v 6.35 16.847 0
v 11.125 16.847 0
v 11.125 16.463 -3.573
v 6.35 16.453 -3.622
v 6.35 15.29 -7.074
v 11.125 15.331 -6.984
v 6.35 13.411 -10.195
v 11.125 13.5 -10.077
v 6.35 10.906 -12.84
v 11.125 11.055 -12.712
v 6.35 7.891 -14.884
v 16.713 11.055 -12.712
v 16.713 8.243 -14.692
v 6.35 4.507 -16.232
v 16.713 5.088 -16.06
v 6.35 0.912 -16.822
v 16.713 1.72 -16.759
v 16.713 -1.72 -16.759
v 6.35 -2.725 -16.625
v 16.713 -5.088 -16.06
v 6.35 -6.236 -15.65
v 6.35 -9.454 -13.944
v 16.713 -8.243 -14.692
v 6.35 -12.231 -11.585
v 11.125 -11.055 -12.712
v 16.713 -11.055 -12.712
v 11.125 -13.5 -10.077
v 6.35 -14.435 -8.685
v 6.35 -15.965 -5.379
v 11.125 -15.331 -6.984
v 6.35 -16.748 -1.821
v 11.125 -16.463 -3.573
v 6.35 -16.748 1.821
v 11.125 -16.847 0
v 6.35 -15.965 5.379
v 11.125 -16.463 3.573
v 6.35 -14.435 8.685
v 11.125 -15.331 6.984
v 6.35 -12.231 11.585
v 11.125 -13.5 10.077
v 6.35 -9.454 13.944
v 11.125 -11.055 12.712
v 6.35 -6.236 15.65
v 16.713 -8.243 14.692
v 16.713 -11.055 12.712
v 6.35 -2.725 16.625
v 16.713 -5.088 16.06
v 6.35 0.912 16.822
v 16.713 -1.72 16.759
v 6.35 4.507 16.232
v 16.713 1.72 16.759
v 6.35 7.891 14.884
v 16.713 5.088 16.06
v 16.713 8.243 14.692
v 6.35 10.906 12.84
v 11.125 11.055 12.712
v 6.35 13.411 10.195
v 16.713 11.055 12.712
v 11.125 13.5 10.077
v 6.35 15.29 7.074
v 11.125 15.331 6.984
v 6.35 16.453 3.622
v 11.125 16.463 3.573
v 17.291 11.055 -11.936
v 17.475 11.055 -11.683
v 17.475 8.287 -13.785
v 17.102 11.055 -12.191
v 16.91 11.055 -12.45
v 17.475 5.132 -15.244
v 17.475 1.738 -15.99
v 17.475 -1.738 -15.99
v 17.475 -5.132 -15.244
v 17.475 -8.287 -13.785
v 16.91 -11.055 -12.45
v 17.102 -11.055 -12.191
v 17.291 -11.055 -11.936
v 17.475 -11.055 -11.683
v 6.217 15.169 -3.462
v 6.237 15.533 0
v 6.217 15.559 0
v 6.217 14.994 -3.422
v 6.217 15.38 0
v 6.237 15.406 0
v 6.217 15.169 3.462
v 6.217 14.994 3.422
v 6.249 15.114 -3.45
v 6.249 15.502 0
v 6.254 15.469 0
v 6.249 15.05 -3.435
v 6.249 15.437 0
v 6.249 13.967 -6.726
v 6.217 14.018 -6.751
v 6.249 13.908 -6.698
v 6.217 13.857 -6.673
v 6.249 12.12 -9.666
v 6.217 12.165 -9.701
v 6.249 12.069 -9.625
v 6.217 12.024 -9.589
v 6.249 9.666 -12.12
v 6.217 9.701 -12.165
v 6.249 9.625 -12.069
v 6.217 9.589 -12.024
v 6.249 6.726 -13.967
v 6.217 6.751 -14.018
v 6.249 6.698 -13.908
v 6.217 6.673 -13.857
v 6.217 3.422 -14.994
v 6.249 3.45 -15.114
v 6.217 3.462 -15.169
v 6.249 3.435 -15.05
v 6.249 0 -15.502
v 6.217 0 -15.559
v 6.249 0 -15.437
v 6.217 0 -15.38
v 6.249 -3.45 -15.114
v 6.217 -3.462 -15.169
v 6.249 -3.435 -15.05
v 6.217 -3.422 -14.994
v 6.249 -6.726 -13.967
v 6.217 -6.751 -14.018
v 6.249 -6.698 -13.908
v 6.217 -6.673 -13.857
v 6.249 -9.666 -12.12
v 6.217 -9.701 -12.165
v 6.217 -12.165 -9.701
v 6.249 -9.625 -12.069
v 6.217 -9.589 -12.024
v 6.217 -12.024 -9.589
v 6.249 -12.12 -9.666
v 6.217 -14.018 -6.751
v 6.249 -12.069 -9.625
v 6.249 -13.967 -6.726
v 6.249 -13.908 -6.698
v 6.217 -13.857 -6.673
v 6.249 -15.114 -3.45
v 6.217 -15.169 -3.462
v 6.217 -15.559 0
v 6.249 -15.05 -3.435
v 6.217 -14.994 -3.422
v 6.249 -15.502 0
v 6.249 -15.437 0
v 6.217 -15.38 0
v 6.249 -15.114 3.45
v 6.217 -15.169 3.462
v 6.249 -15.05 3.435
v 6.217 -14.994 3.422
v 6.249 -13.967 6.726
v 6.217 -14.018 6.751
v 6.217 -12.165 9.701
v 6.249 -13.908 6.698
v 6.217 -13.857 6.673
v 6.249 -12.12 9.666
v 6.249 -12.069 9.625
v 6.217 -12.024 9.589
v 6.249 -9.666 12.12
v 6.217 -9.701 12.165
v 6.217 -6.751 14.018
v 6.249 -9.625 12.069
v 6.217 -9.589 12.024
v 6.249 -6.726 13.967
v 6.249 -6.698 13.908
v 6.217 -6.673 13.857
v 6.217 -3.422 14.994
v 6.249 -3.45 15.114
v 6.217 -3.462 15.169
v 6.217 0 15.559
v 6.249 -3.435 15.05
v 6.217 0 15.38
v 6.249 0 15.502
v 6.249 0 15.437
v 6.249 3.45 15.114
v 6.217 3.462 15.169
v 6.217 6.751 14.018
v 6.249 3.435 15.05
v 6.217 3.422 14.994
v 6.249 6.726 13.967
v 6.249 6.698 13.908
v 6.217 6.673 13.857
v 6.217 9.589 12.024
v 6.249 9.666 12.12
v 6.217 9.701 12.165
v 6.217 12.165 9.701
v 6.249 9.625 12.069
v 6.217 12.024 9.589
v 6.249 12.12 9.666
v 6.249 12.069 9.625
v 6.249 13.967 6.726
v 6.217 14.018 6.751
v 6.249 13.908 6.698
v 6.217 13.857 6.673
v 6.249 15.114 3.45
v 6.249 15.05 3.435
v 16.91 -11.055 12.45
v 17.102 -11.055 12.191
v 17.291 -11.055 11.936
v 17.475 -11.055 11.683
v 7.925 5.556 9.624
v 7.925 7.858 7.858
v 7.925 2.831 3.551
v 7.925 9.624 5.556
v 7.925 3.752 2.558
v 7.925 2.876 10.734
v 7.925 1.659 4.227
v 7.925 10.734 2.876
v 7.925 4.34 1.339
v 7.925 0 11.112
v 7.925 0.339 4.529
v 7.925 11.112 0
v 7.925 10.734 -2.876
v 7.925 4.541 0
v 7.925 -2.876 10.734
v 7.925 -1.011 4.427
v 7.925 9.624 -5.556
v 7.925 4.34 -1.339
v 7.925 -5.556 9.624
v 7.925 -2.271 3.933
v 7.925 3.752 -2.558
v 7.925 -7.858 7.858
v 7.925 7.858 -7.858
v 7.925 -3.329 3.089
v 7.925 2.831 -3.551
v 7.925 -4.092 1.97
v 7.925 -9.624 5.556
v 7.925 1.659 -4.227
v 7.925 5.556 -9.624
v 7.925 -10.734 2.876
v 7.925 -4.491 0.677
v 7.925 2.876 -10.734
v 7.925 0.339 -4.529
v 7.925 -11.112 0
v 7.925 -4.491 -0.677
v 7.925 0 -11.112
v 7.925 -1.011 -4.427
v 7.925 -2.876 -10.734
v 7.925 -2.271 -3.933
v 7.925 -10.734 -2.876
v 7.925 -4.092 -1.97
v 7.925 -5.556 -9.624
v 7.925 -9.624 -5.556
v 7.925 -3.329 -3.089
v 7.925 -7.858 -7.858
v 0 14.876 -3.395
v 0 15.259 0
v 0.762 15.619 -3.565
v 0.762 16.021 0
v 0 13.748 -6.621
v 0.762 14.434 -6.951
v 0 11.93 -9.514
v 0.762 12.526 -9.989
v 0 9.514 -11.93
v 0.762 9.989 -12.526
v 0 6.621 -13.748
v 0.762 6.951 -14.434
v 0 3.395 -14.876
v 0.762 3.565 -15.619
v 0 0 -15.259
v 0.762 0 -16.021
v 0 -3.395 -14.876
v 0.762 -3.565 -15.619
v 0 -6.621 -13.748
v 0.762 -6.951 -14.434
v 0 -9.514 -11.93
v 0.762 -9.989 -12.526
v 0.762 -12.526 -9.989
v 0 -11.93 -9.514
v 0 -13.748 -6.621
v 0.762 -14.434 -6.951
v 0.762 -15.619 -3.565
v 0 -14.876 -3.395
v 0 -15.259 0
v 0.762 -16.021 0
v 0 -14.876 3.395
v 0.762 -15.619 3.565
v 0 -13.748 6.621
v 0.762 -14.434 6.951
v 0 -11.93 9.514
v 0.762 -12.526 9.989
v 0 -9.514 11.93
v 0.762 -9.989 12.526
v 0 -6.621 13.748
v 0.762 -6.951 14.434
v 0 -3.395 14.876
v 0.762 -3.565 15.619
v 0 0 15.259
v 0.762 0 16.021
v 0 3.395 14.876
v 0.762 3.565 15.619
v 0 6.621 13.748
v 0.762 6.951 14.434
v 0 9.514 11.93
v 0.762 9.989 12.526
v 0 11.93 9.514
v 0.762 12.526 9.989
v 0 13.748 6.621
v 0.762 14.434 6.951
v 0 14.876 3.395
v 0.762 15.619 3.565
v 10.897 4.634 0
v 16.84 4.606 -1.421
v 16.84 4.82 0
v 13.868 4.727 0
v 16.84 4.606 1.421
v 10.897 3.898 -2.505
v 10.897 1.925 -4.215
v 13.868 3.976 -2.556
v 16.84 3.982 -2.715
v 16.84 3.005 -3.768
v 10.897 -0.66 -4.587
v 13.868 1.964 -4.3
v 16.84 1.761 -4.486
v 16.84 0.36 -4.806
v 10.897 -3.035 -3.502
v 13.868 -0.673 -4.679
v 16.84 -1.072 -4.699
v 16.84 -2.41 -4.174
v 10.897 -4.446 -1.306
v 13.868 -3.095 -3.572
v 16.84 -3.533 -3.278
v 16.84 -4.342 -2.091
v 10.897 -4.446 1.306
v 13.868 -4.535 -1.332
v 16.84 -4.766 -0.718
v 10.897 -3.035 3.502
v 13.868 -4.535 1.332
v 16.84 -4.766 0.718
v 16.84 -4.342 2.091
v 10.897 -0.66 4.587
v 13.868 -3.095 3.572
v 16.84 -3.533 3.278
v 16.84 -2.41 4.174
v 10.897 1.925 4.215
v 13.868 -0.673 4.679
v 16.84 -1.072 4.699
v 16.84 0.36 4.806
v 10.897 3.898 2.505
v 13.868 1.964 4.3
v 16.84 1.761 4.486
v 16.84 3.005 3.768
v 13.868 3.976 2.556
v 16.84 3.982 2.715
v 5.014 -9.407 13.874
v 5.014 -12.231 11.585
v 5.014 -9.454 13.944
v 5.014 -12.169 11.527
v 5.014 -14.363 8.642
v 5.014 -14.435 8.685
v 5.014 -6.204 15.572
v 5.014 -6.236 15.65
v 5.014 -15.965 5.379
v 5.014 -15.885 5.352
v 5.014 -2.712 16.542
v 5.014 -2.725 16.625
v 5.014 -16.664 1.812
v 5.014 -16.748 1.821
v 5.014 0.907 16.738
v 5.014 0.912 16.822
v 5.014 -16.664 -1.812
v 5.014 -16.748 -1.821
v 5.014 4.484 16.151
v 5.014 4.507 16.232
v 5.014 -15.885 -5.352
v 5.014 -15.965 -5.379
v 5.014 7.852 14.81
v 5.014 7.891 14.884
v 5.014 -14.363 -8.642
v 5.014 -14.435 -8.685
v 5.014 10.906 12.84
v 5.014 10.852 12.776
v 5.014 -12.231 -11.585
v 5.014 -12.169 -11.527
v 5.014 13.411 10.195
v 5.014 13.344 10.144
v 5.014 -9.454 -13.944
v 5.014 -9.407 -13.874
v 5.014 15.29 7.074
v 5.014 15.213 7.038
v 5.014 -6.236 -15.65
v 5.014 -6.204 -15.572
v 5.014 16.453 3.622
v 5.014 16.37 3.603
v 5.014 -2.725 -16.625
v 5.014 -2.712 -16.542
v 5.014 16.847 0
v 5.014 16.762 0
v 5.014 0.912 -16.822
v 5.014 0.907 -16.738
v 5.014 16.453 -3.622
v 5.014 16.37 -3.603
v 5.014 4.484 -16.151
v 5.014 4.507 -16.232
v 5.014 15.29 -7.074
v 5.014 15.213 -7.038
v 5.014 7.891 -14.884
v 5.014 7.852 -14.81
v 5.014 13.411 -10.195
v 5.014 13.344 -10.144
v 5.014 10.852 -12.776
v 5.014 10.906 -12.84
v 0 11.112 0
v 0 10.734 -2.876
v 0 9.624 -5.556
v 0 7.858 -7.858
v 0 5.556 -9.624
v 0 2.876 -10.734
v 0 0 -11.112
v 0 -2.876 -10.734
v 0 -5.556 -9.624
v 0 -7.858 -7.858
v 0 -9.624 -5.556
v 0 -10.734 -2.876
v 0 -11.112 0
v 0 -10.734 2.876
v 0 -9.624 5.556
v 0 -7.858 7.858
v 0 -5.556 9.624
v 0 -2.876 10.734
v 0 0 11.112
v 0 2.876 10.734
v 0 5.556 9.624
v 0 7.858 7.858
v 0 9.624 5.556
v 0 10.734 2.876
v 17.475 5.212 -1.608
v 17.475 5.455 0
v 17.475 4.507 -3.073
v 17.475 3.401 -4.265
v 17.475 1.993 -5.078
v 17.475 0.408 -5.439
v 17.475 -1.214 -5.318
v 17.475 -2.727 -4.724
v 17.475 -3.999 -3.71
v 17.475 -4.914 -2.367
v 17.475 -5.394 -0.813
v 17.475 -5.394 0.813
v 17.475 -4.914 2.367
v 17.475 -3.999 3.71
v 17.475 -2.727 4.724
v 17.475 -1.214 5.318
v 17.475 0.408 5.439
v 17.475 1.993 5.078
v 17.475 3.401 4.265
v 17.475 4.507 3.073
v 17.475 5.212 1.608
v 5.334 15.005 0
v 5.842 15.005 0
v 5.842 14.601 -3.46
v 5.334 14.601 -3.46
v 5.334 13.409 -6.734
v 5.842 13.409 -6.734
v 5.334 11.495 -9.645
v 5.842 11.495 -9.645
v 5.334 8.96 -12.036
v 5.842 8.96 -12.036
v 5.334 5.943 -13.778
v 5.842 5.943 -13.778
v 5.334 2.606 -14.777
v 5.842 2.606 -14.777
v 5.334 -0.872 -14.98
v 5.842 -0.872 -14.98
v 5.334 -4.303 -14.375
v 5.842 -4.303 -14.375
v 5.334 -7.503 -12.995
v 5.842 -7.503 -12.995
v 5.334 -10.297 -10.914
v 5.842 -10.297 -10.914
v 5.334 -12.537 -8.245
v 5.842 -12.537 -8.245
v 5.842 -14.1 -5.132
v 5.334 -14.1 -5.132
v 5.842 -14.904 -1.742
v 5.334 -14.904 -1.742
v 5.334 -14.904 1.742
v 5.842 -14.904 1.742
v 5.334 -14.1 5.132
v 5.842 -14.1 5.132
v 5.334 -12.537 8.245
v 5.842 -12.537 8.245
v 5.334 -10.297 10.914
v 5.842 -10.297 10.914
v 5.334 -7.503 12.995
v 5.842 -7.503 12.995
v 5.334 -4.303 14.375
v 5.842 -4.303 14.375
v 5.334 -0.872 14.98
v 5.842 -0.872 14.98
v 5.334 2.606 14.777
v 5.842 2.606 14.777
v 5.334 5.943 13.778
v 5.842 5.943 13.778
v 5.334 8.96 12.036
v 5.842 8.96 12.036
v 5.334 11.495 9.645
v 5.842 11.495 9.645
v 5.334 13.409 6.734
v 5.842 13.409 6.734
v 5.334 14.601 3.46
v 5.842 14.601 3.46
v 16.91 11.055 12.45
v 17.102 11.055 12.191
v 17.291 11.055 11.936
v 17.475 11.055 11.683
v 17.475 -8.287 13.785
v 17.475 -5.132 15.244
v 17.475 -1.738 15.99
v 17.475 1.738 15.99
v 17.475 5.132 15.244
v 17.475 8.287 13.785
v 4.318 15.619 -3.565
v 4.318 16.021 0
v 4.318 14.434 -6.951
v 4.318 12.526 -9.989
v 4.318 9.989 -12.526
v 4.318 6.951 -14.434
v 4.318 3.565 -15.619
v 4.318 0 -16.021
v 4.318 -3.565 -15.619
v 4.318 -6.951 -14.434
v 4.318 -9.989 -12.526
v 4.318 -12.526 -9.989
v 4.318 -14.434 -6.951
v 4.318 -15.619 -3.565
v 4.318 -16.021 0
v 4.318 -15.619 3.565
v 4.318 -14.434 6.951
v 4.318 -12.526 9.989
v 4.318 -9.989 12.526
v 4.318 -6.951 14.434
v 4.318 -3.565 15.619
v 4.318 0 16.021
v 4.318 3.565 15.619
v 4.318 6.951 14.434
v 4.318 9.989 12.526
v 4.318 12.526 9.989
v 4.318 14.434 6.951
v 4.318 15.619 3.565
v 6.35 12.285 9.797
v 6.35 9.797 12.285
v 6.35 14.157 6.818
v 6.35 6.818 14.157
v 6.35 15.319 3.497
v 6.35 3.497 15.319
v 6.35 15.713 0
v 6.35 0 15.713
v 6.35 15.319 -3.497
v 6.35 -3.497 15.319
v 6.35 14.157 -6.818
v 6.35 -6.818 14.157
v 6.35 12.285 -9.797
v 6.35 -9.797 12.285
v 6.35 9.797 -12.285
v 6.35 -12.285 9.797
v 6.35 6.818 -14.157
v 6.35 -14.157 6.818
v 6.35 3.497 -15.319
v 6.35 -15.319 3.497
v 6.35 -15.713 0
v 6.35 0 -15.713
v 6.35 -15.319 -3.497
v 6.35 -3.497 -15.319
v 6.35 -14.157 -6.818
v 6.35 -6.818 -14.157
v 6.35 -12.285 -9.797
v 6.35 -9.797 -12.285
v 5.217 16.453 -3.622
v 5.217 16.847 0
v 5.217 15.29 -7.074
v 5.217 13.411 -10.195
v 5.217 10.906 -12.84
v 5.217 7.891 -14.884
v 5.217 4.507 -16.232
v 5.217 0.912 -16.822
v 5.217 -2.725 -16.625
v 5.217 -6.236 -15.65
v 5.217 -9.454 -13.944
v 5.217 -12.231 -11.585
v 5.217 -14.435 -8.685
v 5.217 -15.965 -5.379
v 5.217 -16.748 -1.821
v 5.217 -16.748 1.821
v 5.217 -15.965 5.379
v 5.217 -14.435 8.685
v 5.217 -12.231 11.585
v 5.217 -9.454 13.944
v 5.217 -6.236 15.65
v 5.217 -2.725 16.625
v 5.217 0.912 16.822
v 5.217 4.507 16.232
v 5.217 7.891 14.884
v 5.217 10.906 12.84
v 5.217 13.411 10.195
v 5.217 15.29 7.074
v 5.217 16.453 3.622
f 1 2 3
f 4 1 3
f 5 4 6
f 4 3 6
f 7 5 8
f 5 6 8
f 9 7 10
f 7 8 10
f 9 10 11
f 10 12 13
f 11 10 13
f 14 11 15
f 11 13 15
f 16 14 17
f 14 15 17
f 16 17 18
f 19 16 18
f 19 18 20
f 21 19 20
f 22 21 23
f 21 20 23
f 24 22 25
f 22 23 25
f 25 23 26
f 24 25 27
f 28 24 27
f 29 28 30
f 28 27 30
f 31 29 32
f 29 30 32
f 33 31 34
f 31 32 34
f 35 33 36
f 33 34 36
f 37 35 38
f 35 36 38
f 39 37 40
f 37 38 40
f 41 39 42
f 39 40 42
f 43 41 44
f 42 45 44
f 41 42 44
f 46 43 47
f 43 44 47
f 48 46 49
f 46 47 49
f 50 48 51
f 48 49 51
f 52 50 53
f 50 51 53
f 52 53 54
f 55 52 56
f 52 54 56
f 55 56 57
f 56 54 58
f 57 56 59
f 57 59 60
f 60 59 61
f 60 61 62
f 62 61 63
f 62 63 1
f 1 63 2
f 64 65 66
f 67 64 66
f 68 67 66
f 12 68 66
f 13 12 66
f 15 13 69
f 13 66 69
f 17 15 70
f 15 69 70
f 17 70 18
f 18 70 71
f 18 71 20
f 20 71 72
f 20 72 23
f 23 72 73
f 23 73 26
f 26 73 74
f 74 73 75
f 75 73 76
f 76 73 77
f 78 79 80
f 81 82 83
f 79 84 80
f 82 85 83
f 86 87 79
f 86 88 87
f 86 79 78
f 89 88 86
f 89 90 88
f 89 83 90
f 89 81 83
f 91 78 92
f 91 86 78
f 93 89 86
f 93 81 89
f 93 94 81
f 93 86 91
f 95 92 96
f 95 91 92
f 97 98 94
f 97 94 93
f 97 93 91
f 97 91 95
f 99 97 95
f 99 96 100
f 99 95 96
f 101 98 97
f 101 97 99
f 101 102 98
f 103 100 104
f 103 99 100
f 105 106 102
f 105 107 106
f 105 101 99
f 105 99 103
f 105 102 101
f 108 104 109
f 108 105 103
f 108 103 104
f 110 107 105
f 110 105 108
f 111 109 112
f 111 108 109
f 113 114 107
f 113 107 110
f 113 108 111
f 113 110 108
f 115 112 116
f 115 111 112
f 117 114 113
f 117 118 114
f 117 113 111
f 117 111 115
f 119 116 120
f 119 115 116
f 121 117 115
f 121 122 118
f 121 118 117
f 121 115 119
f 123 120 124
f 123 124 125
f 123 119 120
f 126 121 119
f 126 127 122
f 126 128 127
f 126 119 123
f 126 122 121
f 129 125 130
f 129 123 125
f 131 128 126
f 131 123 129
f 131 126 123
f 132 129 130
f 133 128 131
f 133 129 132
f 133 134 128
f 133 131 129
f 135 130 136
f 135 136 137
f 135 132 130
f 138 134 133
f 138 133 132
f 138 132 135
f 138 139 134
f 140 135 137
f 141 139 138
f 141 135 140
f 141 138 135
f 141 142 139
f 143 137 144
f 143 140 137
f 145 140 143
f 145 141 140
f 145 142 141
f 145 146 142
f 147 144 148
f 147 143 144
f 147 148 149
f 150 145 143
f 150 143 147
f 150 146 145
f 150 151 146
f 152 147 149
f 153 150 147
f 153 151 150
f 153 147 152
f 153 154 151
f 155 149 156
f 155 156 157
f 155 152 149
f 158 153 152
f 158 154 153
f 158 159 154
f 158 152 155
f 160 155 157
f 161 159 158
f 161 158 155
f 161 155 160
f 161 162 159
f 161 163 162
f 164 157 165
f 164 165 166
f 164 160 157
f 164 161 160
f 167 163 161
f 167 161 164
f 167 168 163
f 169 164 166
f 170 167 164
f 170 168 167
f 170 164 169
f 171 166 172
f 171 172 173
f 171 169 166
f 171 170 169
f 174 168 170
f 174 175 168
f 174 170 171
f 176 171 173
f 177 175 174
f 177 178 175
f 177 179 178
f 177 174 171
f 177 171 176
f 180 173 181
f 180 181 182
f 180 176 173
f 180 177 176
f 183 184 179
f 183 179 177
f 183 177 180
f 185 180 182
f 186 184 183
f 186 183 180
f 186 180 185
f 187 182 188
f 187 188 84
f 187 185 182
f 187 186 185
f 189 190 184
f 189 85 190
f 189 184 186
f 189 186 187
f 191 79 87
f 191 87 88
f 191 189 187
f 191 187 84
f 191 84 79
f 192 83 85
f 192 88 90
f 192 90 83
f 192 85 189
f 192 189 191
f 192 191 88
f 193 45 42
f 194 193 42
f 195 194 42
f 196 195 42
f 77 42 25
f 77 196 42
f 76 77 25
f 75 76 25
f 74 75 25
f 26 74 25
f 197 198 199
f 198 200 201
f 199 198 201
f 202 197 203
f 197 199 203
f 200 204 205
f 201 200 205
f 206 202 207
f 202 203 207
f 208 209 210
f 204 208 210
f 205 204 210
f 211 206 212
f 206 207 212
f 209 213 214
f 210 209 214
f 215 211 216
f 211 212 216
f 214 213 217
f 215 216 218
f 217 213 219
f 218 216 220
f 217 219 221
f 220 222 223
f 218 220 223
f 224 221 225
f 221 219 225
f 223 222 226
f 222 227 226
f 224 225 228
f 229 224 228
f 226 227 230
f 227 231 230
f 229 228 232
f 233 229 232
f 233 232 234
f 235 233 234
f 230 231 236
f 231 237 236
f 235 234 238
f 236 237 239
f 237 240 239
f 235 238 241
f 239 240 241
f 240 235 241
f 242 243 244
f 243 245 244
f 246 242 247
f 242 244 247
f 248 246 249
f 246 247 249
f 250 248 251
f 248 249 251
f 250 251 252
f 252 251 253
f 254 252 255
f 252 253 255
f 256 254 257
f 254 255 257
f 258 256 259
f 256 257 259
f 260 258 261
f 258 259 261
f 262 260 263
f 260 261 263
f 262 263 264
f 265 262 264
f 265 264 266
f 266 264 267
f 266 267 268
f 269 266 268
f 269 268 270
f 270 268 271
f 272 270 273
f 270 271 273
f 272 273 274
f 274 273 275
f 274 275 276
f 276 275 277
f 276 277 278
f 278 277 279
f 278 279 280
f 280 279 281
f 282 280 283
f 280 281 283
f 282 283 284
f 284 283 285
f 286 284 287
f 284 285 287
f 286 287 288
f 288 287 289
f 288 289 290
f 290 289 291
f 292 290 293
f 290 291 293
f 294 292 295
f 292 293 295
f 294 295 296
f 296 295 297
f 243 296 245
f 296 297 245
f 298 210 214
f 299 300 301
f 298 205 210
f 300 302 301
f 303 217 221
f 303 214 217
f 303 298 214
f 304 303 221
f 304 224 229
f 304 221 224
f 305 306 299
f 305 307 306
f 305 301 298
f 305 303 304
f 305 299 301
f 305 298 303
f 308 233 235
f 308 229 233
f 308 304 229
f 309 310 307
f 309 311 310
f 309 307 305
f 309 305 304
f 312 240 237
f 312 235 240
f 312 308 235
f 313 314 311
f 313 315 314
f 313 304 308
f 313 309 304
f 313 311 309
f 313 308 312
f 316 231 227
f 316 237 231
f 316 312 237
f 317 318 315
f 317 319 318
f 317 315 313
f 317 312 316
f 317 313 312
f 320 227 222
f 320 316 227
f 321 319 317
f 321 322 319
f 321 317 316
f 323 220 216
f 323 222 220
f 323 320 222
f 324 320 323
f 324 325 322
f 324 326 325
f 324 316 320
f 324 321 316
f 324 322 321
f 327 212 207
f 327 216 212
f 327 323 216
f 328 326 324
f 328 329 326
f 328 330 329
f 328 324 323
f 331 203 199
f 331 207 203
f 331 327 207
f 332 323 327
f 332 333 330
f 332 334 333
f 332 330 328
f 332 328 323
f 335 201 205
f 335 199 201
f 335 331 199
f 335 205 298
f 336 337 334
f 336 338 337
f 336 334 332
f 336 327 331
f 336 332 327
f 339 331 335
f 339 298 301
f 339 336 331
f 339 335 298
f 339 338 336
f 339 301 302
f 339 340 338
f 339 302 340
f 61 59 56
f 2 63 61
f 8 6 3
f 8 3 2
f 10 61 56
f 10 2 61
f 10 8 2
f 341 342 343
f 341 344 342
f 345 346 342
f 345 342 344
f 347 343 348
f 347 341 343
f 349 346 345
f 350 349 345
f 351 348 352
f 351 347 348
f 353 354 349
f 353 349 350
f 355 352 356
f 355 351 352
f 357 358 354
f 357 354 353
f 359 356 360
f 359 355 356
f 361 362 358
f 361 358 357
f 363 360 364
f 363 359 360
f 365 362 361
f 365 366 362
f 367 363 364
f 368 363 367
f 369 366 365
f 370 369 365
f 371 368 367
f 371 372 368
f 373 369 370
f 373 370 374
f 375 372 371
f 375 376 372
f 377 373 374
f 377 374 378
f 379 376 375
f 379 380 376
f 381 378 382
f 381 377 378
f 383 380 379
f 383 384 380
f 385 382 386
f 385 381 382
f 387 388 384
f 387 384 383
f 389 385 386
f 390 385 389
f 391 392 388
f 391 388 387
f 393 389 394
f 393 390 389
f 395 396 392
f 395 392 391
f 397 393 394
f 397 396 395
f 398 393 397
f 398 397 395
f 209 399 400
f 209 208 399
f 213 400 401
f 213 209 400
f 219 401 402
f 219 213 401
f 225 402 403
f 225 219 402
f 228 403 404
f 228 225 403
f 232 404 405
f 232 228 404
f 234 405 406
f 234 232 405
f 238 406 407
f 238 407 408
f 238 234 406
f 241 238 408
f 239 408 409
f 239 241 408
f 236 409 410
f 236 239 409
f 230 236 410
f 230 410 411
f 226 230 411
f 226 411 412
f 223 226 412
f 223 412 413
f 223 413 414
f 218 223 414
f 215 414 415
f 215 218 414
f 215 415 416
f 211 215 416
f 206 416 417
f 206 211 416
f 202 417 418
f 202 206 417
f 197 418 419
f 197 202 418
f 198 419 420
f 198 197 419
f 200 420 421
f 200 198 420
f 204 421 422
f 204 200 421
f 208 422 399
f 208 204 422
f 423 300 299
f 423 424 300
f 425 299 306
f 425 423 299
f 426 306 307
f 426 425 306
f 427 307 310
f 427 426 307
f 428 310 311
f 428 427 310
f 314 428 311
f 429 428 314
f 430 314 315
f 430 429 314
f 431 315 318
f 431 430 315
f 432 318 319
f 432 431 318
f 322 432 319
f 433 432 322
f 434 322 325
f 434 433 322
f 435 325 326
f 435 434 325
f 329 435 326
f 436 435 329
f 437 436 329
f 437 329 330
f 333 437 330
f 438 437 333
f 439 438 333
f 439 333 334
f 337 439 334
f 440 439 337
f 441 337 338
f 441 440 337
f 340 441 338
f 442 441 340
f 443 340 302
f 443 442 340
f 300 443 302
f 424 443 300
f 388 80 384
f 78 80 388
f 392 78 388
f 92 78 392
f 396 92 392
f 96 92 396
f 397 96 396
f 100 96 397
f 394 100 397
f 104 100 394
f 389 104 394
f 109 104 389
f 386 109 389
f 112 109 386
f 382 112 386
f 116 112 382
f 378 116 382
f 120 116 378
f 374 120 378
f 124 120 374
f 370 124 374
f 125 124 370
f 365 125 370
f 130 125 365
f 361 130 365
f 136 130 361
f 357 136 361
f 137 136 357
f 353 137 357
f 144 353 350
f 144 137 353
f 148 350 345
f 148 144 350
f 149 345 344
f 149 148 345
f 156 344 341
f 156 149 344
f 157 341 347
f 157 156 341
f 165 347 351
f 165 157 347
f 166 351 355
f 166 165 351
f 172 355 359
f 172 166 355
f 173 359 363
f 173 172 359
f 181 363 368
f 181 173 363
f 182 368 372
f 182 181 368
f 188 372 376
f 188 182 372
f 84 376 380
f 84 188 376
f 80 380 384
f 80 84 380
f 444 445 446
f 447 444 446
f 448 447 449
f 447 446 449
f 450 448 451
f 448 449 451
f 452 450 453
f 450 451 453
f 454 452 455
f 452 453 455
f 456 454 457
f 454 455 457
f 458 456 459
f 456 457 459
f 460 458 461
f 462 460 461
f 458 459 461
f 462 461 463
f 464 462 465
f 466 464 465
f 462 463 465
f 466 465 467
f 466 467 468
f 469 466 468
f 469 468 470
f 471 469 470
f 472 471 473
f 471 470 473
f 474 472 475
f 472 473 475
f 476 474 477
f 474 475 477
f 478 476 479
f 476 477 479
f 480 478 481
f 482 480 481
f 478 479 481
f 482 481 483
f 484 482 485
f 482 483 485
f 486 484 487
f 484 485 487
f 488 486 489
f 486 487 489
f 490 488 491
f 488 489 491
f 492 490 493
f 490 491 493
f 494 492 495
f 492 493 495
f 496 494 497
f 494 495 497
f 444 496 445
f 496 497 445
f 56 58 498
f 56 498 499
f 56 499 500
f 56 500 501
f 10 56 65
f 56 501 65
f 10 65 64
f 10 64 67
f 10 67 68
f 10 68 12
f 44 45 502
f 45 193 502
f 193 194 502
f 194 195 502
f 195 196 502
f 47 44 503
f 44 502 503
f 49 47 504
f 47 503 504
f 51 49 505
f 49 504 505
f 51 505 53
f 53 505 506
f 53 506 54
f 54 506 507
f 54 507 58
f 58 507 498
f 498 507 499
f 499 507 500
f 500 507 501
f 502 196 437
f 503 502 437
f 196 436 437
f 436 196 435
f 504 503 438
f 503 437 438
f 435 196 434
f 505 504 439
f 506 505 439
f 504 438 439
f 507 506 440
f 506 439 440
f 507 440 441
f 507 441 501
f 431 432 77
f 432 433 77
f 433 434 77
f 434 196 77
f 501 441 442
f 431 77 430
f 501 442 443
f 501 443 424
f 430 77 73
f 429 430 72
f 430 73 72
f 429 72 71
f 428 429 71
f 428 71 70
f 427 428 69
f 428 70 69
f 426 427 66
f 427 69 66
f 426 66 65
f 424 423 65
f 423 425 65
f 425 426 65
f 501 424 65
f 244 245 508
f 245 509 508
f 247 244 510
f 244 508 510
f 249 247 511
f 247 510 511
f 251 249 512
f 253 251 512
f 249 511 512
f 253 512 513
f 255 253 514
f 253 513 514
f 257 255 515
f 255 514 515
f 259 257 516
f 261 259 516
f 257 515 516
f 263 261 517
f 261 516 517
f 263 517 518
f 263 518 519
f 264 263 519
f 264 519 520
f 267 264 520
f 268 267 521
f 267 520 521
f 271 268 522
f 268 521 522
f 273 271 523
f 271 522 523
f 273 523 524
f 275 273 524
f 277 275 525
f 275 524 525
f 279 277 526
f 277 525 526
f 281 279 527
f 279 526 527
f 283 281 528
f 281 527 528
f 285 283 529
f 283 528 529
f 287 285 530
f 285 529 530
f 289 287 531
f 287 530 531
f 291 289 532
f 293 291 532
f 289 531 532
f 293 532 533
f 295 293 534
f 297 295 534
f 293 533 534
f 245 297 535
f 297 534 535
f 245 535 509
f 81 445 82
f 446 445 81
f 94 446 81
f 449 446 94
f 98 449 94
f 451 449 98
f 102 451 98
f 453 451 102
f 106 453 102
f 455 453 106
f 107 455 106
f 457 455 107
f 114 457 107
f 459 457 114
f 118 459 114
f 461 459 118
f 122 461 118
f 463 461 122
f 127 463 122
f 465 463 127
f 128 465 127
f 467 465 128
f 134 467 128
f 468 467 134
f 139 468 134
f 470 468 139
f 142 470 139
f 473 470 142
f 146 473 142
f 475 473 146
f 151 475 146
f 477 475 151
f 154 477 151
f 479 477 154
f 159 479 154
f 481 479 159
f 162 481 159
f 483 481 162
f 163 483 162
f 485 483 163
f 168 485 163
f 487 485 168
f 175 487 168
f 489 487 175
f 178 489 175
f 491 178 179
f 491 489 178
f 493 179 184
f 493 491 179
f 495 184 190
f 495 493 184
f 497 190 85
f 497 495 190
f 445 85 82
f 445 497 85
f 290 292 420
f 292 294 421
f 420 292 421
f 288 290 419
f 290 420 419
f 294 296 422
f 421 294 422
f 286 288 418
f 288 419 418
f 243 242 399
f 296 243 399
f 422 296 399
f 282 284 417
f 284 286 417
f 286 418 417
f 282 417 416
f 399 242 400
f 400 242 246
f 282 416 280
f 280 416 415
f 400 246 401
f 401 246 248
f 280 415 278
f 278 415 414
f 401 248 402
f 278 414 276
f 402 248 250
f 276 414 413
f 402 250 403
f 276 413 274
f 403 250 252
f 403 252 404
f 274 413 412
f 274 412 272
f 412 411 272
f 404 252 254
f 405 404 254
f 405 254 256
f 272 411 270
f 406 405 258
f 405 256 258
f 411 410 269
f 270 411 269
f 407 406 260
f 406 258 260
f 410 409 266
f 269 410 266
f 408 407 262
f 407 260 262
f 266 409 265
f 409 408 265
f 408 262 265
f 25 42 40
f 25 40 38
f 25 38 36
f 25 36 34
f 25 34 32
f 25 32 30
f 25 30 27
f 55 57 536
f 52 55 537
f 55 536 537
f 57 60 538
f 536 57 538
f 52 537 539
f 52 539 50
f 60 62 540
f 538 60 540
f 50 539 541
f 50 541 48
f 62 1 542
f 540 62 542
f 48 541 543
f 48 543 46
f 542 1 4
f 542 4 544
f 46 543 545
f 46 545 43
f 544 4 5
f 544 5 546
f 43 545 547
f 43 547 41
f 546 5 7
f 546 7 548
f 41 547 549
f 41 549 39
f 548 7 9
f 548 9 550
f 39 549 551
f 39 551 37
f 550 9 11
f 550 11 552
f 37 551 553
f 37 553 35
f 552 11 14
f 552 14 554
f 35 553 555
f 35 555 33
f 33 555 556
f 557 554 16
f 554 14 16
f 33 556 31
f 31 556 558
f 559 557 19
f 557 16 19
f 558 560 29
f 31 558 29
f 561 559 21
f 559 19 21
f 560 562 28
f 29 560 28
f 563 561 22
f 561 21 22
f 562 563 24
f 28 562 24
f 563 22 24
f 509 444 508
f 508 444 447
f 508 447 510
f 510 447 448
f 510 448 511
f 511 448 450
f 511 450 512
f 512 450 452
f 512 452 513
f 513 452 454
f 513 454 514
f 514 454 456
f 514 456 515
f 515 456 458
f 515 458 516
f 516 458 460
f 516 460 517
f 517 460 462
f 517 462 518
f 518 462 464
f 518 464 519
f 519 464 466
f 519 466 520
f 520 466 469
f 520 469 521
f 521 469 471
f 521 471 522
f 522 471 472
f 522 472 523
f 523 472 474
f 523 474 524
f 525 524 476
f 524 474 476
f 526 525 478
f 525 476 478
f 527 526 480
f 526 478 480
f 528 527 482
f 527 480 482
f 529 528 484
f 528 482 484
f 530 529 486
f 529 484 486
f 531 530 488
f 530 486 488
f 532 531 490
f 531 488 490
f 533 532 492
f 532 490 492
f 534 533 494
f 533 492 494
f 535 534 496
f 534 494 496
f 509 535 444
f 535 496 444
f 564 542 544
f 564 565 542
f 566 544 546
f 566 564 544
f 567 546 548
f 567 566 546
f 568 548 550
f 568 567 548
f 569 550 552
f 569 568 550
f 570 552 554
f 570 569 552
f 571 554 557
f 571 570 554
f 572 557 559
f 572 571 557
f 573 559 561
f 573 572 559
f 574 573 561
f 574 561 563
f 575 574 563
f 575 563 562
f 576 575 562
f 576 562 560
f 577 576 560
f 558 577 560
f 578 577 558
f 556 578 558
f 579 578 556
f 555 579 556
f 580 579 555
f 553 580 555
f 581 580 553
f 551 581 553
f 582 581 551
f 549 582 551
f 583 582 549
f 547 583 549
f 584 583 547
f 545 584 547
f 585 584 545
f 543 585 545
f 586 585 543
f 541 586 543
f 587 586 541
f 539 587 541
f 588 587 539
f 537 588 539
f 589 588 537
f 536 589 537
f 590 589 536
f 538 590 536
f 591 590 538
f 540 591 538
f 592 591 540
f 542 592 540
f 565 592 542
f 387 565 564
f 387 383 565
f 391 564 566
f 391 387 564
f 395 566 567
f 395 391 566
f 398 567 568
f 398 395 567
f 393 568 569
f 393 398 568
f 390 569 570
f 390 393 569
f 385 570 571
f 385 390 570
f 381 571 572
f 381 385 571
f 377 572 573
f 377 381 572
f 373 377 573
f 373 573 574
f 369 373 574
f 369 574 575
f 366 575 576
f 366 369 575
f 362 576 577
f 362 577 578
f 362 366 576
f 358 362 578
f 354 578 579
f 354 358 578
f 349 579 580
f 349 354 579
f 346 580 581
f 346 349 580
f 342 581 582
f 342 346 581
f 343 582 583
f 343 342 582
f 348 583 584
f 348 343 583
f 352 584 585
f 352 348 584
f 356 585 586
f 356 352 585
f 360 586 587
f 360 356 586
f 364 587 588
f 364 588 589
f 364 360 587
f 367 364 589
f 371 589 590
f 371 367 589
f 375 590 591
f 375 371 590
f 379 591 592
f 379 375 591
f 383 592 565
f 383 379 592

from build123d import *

# Parameters (mm, degrees)
SKETCH3_W          = 134.7724
SKETCH3_H          = 67.3862
SKETCH3_W_2        = 67.3862
SKETCH3_H_2        = 22.1107
CUT_EXTRUDE1_DEPTH = 6.35
SKETCH4_W          = 7.9248
SKETCH4_H          = 11.1125


with BuildPart() as part:
    # Sketch1 → Revolve1 (revolve)
    with BuildSketch(Plane.XY):
        Polygon((0, 0), (0, 15.25905), (0.762, 16.02105), (4.318, 16.02105), (5.334, 15.00505), (6.35, 15.00505), (6.35, 16.84655), (16.7132, 16.84655), (17.4752, 16.08455), (17.4752, 0), align=None)
    revolve(axis=Axis((17.4752, 0, 0), (-1, 0, 0)))

    # Sketch2 → Cut-Revolve1 (revolve, cut)
    with BuildSketch(Plane.XY):
        Polygon((0, 0), (0, 4.3688), (2.398876108, 4.3688), (16.840187191, 4.819651116), (17.4752, 5.454663925), (17.4752, 0), align=None)
    revolve(axis=Axis((17.4752, 0, 0), (-1, 0, 0)), mode=Mode.SUBTRACT)

    # Sketch3 → Cut-Extrude1 (cut)
    with BuildSketch(Plane(origin=(17.4752, 0, 0), x_dir=(0, 0, -1), z_dir=(1, 0, 0))):
        Rectangle(SKETCH3_W, SKETCH3_H)
        Rectangle(SKETCH3_W_2, SKETCH3_H_2, mode=Mode.SUBTRACT)
    extrude(amount=-CUT_EXTRUDE1_DEPTH, mode=Mode.SUBTRACT)

    # Sketch4 → Cut-Revolve2 (revolve, cut)
    with BuildSketch(Plane.XY):
        with Locations((3.9624, 5.55625)):
            Rectangle(SKETCH4_W, SKETCH4_H)
    revolve(axis=Axis((7.9248, 0, 0), (-1, 0, 0)), mode=Mode.SUBTRACT)

    # Sketch5 → Revolve2 (revolve)
    with BuildSketch(Plane.XY):
        with BuildLine():
            Line((5.013509175, 16.762381804), (6.216617928, 15.559273051))
            ThreePointArc((6.216617928, 15.559273051), (6.253815367, 15.46947049), (6.216617928, 15.379667928))
            Line((6.216617928, 15.379667928), (5.842, 15.00505))
            Line((5.842, 15.00505), (5.334, 15.00505))
            Line((5.334, 15.00505), (5.334, 14.75105))
            Line((5.334, 14.75105), (6.35, 14.75105))
            Line((6.35, 14.75105), (6.35, 15.713259175))
            Line((6.35, 15.713259175), (5.216709175, 16.84655))
            Line((5.216709175, 16.84655), (5.013509175, 16.84655))
            Line((5.013509175, 16.84655), (5.013509175, 16.762381804))
        make_face()
    revolve(axis=Axis((6.35, 0, 0), (-1, 0, 0)))


solid = part.part
